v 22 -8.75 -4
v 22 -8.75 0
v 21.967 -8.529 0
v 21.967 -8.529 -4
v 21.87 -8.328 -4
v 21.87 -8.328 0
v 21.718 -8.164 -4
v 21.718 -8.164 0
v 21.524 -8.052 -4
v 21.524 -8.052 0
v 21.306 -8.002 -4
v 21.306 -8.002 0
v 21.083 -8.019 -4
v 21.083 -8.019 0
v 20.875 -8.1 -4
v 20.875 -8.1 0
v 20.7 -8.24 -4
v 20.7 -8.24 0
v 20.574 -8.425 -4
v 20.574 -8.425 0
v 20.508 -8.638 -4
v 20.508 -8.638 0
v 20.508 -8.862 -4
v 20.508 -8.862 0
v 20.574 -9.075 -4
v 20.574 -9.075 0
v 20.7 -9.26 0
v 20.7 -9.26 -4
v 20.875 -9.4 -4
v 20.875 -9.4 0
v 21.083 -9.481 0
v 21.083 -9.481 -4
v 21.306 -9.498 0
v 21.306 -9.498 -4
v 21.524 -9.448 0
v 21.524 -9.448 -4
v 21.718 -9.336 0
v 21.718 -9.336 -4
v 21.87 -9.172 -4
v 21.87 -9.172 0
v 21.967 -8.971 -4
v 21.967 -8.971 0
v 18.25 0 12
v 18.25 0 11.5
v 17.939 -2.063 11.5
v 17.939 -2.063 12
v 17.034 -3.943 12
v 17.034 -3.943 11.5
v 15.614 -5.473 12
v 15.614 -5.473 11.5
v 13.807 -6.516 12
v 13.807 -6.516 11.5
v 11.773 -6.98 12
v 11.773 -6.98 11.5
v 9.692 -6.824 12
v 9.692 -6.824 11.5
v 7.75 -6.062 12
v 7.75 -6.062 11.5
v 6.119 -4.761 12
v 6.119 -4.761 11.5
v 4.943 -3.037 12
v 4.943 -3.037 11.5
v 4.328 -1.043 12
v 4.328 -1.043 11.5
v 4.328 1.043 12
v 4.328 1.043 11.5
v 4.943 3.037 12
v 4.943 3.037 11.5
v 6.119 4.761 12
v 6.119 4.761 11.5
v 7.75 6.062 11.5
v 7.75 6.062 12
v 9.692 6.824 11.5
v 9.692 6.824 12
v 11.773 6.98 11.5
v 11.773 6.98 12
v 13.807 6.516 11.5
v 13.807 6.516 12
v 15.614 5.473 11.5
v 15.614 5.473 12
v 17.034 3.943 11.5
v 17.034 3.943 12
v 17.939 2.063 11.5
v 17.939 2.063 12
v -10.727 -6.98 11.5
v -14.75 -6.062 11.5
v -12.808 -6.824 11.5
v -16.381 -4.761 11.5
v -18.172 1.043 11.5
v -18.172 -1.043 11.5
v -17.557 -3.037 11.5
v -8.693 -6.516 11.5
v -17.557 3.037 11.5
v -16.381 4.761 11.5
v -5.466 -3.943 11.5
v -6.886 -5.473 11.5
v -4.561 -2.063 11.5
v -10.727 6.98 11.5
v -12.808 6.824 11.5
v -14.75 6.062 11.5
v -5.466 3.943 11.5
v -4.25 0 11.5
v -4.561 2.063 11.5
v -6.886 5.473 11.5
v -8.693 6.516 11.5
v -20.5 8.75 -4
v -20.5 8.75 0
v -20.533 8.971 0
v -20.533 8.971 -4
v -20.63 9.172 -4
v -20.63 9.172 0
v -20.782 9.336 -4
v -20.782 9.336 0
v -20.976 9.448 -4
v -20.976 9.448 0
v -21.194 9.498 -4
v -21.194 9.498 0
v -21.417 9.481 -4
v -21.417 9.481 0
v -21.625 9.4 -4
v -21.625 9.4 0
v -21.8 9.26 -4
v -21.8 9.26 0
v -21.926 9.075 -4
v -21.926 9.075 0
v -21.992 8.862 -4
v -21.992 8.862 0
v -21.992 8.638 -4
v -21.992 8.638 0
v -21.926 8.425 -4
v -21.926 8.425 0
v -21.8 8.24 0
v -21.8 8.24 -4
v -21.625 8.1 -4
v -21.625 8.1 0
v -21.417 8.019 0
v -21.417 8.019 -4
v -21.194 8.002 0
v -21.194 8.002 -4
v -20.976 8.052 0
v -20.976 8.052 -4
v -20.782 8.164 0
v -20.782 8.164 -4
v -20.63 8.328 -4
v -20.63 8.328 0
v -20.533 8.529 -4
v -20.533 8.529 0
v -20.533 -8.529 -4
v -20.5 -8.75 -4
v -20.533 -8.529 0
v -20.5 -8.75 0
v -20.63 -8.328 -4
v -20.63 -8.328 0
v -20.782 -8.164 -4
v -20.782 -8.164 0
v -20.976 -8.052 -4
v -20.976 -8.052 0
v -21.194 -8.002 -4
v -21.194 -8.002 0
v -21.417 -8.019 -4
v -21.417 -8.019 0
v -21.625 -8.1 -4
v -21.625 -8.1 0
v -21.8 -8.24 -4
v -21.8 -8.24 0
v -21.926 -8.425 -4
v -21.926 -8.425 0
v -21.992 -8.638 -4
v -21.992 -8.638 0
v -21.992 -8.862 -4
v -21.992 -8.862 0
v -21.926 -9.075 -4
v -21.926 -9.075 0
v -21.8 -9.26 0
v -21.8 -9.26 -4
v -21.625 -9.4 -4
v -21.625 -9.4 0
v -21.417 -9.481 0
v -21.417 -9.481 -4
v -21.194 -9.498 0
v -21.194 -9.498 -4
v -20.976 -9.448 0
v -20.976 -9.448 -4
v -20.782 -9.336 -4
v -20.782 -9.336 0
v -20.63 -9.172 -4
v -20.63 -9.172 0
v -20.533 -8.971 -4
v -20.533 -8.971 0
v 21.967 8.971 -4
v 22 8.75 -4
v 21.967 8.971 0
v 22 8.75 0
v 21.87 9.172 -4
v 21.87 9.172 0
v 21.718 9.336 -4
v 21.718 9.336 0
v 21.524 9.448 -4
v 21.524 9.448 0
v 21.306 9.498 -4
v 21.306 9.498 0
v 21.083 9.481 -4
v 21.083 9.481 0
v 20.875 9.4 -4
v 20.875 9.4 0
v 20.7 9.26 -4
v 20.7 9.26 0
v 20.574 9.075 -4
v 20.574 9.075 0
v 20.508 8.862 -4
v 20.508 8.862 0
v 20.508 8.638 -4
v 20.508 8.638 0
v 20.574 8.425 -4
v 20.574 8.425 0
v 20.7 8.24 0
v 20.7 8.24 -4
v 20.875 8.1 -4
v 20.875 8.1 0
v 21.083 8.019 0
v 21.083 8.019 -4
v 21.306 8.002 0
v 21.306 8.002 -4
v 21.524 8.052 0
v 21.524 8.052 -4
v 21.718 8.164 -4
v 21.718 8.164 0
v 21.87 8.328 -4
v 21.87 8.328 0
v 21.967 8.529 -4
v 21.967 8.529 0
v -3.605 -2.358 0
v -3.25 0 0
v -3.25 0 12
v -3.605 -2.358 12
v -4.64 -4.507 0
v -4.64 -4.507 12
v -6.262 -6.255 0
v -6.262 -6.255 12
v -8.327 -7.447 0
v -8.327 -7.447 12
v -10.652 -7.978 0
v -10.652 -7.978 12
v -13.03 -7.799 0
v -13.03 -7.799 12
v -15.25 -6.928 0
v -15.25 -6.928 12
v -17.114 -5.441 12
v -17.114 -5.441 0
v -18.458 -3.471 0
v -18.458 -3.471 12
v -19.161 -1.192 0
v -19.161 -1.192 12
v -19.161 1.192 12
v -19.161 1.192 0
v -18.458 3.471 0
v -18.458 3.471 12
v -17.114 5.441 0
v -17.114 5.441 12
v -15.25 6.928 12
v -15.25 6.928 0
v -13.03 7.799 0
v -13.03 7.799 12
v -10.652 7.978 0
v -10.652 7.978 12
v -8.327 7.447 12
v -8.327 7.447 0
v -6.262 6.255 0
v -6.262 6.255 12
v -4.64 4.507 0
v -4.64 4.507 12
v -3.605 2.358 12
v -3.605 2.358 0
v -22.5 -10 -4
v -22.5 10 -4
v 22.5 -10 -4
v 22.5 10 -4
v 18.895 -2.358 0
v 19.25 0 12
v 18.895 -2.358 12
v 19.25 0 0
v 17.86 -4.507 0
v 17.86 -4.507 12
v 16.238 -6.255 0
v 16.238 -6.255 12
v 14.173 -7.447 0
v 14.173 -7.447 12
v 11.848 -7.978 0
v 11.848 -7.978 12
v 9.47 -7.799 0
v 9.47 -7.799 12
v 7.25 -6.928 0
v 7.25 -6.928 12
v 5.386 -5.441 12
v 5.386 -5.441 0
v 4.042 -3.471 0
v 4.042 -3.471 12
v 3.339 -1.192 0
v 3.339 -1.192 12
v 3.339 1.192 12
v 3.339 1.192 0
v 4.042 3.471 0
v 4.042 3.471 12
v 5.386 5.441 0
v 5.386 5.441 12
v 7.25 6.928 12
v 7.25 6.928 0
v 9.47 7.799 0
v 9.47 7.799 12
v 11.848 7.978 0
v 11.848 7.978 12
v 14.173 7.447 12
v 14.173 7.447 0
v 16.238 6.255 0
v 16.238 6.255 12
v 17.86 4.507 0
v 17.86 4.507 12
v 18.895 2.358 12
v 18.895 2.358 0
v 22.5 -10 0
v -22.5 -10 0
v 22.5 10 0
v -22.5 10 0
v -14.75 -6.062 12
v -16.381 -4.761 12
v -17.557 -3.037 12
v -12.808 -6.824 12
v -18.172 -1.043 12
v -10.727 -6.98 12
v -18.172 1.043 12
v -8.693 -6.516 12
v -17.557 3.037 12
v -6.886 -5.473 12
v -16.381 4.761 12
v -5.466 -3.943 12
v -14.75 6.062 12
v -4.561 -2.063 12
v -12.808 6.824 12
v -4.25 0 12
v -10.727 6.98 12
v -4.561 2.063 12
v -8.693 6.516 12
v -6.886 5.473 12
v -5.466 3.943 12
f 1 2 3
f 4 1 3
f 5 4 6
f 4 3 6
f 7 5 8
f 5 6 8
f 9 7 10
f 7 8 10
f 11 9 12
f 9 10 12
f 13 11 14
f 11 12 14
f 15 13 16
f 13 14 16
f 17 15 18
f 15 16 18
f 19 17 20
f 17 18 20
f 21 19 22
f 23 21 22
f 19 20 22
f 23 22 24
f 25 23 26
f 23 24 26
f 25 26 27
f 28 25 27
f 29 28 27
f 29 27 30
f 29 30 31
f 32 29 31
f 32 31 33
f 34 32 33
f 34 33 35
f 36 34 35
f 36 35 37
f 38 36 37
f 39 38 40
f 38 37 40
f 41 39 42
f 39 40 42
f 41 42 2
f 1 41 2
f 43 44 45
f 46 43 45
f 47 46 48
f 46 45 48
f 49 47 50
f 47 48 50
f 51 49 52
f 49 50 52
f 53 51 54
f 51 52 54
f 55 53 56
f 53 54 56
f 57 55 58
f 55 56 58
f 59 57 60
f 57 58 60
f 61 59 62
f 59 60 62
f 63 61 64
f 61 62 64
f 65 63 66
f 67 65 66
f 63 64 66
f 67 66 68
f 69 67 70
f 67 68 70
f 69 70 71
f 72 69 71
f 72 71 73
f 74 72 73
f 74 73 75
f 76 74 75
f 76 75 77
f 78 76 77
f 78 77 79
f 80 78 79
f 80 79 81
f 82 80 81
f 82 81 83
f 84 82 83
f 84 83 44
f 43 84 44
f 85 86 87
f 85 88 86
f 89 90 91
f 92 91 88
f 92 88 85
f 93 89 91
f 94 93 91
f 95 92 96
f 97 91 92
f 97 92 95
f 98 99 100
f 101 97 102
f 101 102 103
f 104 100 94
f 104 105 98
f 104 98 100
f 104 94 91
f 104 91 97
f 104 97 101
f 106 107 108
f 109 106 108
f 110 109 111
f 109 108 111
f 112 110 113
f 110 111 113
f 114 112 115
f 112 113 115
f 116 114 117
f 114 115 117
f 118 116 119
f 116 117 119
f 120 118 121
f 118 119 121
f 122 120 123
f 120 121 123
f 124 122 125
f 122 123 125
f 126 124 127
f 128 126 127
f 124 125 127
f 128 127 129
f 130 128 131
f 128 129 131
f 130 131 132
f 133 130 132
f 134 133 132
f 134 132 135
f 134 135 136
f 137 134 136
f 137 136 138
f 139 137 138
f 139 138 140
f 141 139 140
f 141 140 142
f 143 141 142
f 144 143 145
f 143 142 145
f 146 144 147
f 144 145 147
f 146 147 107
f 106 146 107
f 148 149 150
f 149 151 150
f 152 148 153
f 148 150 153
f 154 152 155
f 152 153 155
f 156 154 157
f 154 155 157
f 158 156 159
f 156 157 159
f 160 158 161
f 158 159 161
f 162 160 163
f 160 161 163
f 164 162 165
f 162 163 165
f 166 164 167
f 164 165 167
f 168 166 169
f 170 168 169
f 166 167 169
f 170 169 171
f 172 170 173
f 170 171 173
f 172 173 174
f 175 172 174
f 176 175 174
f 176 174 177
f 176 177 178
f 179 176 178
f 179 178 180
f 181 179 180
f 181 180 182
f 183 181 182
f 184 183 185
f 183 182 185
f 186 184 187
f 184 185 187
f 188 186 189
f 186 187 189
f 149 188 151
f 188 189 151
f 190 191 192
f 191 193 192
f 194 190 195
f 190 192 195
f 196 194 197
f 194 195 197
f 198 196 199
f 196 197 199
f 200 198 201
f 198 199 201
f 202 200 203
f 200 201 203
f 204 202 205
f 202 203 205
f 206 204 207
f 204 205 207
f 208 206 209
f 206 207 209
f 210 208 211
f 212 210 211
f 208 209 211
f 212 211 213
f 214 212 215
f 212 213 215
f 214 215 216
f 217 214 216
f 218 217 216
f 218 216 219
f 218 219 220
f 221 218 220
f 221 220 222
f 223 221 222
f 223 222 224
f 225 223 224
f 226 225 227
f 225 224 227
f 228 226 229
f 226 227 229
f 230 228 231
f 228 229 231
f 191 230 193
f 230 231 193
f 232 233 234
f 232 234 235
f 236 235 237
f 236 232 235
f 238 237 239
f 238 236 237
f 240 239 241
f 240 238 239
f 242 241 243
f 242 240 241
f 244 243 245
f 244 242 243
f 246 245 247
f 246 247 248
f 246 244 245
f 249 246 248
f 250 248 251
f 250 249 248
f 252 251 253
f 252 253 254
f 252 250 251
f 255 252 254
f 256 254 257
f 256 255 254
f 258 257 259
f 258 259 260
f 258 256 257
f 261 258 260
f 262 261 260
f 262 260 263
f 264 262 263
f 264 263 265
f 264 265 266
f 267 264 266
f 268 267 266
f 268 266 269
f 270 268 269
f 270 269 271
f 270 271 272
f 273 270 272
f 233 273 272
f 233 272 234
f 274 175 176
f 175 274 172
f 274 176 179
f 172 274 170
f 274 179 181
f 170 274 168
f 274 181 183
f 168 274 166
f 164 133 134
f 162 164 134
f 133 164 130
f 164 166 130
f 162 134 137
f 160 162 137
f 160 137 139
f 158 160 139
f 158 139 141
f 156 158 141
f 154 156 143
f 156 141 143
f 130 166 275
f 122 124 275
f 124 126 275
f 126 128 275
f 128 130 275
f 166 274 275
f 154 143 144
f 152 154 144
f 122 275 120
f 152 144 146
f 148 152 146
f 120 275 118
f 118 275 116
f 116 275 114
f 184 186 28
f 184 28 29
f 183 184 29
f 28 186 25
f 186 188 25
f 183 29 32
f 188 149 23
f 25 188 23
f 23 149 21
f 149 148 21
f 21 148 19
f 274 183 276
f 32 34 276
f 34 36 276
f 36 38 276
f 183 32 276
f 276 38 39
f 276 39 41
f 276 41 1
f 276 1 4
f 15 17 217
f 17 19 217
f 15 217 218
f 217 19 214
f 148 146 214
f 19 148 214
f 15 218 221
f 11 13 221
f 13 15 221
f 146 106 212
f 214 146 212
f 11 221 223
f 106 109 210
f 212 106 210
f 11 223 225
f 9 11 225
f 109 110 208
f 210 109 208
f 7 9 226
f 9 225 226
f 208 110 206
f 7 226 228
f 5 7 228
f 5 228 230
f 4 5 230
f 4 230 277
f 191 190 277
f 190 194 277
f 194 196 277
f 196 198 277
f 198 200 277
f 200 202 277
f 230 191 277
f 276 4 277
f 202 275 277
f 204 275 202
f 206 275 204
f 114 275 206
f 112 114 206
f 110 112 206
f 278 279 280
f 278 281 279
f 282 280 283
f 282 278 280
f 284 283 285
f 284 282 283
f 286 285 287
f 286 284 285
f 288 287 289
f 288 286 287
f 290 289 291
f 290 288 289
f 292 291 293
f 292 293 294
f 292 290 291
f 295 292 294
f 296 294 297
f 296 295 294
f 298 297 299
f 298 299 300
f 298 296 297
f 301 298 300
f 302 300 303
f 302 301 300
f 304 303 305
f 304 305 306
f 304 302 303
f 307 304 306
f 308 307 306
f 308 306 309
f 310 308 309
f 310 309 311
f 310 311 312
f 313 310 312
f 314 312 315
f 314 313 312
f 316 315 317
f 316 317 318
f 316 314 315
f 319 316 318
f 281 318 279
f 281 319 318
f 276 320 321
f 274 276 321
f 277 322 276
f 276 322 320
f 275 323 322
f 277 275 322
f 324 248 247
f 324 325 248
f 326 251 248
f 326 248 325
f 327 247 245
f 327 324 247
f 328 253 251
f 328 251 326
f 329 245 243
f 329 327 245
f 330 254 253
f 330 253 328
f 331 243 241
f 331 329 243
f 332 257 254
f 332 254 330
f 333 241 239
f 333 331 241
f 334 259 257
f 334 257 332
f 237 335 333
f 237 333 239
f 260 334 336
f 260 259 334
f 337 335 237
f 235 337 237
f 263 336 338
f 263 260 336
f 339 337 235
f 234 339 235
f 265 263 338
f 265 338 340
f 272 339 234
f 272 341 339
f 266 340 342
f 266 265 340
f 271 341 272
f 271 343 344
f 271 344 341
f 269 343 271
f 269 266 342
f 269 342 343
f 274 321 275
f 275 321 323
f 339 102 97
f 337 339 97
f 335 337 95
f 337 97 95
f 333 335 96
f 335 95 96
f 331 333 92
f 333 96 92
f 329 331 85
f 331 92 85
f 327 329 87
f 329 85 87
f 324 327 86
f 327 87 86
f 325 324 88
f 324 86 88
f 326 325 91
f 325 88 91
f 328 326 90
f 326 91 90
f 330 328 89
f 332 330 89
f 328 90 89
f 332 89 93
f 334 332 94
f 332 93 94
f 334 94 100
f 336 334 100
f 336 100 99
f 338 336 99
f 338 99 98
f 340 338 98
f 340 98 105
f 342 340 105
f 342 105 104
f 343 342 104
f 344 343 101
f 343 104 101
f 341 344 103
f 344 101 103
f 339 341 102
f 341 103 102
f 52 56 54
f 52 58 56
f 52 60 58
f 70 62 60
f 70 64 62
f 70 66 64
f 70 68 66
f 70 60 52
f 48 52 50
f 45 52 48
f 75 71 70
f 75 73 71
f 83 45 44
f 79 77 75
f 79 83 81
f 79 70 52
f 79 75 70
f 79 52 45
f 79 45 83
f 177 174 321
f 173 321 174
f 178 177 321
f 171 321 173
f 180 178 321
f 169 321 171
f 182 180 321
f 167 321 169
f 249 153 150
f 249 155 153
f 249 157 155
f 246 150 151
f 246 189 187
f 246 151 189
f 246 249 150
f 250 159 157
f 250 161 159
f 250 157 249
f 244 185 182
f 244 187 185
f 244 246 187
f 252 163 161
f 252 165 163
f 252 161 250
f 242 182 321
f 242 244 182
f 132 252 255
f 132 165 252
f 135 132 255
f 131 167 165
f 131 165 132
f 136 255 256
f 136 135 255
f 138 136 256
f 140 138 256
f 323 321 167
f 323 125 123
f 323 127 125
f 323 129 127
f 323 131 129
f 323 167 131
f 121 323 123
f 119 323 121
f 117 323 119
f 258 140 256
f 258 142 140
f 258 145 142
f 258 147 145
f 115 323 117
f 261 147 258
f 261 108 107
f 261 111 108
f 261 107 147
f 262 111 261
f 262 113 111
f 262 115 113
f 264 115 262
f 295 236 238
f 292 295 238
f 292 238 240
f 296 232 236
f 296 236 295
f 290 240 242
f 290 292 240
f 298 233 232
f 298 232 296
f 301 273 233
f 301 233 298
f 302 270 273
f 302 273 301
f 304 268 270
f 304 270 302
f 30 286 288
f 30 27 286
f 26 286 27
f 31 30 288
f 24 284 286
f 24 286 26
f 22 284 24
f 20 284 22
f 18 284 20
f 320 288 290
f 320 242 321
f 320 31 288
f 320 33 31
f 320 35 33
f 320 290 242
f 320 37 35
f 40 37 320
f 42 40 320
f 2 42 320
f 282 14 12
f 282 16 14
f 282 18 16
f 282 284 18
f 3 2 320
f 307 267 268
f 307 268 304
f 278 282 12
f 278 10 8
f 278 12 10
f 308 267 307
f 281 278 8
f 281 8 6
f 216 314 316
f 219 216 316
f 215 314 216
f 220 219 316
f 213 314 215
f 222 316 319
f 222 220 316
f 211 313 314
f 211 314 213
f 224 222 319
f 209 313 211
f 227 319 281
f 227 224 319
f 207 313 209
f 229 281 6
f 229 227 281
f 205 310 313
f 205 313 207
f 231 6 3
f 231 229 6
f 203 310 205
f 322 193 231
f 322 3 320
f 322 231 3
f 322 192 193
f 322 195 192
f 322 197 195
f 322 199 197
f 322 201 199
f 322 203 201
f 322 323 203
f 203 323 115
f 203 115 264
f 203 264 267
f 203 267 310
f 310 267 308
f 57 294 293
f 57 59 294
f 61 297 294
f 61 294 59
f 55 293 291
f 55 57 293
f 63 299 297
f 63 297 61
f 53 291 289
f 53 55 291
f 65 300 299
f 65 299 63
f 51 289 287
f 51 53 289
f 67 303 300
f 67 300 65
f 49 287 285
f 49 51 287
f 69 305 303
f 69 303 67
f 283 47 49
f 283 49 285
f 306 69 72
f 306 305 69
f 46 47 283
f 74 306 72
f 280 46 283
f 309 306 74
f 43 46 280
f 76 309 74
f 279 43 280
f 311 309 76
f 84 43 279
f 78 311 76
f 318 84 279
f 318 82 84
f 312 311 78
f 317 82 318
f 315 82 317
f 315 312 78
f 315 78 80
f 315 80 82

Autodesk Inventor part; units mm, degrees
ref_plane "YZ Plane" through (0, 0, 0) normal (1, 0, 0) x (0, 1, 0)
ref_plane "XZ Plane" through (0, 0, 0) normal (0, 1, 0) x (-1, 0, 0)
ref_plane "XY Plane" through (0, 0, 0) normal (0, 0, 1) x (1, 0, 0)
sketch "Skizze1" plane through (0, 0, 0) normal (0, 0, 1) x (1, 0, 0)
  line L0 (-22.5, 10) -> (22.5, 10)
  line L1 (22.5, 10) -> (22.5, -10)
  line L2 (22.5, -10) -> (-22.5, -10)
  line L3 (-22.5, -10) -> (-22.5, 10)
  line L4 (0, -14) -> (0, 14) projected
  line L5 (-31.5, 0) -> (31.5, 0) projected
  circle A0 centre (-11.25, 0) radius 8
  circle A1 centre (11.25, 0) radius 8
  circle A2 centre (-21.25, 8.75) radius 0.75
  circle A3 centre (21.25, 8.75) radius 0.75
  circle A4 centre (-21.25, -8.75) radius 0.75
  circle A5 centre (21.25, -8.75) radius 0.75
  circle A6 centre (-11.25, 0) radius 7
  circle A7 centre (11.25, 0) radius 7
  point P0 (0, 0)
  dimension "d0" = 20
  dimension "d1" = 45
  dimension "d2" = 16
  dimension "d3" = 11.25
  dimension "d4" = 1.5
  dimension "d5" = 1.25
  dimension "d6" = 1.25
  dimension "d11" = 1
  dimension "d12" = 1
extrude "Extrusion1" add sketch "Skizze1" against normal blind 4
extrude "Extrusion3" add sketch "Skizze1" along normal blind 12 contours A0 L5 A6 | L5 A6 A0 | A1 L5 A7 | L5 A7 A1
extrude "Extrusion4" add sketch "Skizze1" along normal blind 11.5 contours A6 L5 | L5 A6 | A7 L5 | L5 A7
properties part number "Ultraschallsensor"
